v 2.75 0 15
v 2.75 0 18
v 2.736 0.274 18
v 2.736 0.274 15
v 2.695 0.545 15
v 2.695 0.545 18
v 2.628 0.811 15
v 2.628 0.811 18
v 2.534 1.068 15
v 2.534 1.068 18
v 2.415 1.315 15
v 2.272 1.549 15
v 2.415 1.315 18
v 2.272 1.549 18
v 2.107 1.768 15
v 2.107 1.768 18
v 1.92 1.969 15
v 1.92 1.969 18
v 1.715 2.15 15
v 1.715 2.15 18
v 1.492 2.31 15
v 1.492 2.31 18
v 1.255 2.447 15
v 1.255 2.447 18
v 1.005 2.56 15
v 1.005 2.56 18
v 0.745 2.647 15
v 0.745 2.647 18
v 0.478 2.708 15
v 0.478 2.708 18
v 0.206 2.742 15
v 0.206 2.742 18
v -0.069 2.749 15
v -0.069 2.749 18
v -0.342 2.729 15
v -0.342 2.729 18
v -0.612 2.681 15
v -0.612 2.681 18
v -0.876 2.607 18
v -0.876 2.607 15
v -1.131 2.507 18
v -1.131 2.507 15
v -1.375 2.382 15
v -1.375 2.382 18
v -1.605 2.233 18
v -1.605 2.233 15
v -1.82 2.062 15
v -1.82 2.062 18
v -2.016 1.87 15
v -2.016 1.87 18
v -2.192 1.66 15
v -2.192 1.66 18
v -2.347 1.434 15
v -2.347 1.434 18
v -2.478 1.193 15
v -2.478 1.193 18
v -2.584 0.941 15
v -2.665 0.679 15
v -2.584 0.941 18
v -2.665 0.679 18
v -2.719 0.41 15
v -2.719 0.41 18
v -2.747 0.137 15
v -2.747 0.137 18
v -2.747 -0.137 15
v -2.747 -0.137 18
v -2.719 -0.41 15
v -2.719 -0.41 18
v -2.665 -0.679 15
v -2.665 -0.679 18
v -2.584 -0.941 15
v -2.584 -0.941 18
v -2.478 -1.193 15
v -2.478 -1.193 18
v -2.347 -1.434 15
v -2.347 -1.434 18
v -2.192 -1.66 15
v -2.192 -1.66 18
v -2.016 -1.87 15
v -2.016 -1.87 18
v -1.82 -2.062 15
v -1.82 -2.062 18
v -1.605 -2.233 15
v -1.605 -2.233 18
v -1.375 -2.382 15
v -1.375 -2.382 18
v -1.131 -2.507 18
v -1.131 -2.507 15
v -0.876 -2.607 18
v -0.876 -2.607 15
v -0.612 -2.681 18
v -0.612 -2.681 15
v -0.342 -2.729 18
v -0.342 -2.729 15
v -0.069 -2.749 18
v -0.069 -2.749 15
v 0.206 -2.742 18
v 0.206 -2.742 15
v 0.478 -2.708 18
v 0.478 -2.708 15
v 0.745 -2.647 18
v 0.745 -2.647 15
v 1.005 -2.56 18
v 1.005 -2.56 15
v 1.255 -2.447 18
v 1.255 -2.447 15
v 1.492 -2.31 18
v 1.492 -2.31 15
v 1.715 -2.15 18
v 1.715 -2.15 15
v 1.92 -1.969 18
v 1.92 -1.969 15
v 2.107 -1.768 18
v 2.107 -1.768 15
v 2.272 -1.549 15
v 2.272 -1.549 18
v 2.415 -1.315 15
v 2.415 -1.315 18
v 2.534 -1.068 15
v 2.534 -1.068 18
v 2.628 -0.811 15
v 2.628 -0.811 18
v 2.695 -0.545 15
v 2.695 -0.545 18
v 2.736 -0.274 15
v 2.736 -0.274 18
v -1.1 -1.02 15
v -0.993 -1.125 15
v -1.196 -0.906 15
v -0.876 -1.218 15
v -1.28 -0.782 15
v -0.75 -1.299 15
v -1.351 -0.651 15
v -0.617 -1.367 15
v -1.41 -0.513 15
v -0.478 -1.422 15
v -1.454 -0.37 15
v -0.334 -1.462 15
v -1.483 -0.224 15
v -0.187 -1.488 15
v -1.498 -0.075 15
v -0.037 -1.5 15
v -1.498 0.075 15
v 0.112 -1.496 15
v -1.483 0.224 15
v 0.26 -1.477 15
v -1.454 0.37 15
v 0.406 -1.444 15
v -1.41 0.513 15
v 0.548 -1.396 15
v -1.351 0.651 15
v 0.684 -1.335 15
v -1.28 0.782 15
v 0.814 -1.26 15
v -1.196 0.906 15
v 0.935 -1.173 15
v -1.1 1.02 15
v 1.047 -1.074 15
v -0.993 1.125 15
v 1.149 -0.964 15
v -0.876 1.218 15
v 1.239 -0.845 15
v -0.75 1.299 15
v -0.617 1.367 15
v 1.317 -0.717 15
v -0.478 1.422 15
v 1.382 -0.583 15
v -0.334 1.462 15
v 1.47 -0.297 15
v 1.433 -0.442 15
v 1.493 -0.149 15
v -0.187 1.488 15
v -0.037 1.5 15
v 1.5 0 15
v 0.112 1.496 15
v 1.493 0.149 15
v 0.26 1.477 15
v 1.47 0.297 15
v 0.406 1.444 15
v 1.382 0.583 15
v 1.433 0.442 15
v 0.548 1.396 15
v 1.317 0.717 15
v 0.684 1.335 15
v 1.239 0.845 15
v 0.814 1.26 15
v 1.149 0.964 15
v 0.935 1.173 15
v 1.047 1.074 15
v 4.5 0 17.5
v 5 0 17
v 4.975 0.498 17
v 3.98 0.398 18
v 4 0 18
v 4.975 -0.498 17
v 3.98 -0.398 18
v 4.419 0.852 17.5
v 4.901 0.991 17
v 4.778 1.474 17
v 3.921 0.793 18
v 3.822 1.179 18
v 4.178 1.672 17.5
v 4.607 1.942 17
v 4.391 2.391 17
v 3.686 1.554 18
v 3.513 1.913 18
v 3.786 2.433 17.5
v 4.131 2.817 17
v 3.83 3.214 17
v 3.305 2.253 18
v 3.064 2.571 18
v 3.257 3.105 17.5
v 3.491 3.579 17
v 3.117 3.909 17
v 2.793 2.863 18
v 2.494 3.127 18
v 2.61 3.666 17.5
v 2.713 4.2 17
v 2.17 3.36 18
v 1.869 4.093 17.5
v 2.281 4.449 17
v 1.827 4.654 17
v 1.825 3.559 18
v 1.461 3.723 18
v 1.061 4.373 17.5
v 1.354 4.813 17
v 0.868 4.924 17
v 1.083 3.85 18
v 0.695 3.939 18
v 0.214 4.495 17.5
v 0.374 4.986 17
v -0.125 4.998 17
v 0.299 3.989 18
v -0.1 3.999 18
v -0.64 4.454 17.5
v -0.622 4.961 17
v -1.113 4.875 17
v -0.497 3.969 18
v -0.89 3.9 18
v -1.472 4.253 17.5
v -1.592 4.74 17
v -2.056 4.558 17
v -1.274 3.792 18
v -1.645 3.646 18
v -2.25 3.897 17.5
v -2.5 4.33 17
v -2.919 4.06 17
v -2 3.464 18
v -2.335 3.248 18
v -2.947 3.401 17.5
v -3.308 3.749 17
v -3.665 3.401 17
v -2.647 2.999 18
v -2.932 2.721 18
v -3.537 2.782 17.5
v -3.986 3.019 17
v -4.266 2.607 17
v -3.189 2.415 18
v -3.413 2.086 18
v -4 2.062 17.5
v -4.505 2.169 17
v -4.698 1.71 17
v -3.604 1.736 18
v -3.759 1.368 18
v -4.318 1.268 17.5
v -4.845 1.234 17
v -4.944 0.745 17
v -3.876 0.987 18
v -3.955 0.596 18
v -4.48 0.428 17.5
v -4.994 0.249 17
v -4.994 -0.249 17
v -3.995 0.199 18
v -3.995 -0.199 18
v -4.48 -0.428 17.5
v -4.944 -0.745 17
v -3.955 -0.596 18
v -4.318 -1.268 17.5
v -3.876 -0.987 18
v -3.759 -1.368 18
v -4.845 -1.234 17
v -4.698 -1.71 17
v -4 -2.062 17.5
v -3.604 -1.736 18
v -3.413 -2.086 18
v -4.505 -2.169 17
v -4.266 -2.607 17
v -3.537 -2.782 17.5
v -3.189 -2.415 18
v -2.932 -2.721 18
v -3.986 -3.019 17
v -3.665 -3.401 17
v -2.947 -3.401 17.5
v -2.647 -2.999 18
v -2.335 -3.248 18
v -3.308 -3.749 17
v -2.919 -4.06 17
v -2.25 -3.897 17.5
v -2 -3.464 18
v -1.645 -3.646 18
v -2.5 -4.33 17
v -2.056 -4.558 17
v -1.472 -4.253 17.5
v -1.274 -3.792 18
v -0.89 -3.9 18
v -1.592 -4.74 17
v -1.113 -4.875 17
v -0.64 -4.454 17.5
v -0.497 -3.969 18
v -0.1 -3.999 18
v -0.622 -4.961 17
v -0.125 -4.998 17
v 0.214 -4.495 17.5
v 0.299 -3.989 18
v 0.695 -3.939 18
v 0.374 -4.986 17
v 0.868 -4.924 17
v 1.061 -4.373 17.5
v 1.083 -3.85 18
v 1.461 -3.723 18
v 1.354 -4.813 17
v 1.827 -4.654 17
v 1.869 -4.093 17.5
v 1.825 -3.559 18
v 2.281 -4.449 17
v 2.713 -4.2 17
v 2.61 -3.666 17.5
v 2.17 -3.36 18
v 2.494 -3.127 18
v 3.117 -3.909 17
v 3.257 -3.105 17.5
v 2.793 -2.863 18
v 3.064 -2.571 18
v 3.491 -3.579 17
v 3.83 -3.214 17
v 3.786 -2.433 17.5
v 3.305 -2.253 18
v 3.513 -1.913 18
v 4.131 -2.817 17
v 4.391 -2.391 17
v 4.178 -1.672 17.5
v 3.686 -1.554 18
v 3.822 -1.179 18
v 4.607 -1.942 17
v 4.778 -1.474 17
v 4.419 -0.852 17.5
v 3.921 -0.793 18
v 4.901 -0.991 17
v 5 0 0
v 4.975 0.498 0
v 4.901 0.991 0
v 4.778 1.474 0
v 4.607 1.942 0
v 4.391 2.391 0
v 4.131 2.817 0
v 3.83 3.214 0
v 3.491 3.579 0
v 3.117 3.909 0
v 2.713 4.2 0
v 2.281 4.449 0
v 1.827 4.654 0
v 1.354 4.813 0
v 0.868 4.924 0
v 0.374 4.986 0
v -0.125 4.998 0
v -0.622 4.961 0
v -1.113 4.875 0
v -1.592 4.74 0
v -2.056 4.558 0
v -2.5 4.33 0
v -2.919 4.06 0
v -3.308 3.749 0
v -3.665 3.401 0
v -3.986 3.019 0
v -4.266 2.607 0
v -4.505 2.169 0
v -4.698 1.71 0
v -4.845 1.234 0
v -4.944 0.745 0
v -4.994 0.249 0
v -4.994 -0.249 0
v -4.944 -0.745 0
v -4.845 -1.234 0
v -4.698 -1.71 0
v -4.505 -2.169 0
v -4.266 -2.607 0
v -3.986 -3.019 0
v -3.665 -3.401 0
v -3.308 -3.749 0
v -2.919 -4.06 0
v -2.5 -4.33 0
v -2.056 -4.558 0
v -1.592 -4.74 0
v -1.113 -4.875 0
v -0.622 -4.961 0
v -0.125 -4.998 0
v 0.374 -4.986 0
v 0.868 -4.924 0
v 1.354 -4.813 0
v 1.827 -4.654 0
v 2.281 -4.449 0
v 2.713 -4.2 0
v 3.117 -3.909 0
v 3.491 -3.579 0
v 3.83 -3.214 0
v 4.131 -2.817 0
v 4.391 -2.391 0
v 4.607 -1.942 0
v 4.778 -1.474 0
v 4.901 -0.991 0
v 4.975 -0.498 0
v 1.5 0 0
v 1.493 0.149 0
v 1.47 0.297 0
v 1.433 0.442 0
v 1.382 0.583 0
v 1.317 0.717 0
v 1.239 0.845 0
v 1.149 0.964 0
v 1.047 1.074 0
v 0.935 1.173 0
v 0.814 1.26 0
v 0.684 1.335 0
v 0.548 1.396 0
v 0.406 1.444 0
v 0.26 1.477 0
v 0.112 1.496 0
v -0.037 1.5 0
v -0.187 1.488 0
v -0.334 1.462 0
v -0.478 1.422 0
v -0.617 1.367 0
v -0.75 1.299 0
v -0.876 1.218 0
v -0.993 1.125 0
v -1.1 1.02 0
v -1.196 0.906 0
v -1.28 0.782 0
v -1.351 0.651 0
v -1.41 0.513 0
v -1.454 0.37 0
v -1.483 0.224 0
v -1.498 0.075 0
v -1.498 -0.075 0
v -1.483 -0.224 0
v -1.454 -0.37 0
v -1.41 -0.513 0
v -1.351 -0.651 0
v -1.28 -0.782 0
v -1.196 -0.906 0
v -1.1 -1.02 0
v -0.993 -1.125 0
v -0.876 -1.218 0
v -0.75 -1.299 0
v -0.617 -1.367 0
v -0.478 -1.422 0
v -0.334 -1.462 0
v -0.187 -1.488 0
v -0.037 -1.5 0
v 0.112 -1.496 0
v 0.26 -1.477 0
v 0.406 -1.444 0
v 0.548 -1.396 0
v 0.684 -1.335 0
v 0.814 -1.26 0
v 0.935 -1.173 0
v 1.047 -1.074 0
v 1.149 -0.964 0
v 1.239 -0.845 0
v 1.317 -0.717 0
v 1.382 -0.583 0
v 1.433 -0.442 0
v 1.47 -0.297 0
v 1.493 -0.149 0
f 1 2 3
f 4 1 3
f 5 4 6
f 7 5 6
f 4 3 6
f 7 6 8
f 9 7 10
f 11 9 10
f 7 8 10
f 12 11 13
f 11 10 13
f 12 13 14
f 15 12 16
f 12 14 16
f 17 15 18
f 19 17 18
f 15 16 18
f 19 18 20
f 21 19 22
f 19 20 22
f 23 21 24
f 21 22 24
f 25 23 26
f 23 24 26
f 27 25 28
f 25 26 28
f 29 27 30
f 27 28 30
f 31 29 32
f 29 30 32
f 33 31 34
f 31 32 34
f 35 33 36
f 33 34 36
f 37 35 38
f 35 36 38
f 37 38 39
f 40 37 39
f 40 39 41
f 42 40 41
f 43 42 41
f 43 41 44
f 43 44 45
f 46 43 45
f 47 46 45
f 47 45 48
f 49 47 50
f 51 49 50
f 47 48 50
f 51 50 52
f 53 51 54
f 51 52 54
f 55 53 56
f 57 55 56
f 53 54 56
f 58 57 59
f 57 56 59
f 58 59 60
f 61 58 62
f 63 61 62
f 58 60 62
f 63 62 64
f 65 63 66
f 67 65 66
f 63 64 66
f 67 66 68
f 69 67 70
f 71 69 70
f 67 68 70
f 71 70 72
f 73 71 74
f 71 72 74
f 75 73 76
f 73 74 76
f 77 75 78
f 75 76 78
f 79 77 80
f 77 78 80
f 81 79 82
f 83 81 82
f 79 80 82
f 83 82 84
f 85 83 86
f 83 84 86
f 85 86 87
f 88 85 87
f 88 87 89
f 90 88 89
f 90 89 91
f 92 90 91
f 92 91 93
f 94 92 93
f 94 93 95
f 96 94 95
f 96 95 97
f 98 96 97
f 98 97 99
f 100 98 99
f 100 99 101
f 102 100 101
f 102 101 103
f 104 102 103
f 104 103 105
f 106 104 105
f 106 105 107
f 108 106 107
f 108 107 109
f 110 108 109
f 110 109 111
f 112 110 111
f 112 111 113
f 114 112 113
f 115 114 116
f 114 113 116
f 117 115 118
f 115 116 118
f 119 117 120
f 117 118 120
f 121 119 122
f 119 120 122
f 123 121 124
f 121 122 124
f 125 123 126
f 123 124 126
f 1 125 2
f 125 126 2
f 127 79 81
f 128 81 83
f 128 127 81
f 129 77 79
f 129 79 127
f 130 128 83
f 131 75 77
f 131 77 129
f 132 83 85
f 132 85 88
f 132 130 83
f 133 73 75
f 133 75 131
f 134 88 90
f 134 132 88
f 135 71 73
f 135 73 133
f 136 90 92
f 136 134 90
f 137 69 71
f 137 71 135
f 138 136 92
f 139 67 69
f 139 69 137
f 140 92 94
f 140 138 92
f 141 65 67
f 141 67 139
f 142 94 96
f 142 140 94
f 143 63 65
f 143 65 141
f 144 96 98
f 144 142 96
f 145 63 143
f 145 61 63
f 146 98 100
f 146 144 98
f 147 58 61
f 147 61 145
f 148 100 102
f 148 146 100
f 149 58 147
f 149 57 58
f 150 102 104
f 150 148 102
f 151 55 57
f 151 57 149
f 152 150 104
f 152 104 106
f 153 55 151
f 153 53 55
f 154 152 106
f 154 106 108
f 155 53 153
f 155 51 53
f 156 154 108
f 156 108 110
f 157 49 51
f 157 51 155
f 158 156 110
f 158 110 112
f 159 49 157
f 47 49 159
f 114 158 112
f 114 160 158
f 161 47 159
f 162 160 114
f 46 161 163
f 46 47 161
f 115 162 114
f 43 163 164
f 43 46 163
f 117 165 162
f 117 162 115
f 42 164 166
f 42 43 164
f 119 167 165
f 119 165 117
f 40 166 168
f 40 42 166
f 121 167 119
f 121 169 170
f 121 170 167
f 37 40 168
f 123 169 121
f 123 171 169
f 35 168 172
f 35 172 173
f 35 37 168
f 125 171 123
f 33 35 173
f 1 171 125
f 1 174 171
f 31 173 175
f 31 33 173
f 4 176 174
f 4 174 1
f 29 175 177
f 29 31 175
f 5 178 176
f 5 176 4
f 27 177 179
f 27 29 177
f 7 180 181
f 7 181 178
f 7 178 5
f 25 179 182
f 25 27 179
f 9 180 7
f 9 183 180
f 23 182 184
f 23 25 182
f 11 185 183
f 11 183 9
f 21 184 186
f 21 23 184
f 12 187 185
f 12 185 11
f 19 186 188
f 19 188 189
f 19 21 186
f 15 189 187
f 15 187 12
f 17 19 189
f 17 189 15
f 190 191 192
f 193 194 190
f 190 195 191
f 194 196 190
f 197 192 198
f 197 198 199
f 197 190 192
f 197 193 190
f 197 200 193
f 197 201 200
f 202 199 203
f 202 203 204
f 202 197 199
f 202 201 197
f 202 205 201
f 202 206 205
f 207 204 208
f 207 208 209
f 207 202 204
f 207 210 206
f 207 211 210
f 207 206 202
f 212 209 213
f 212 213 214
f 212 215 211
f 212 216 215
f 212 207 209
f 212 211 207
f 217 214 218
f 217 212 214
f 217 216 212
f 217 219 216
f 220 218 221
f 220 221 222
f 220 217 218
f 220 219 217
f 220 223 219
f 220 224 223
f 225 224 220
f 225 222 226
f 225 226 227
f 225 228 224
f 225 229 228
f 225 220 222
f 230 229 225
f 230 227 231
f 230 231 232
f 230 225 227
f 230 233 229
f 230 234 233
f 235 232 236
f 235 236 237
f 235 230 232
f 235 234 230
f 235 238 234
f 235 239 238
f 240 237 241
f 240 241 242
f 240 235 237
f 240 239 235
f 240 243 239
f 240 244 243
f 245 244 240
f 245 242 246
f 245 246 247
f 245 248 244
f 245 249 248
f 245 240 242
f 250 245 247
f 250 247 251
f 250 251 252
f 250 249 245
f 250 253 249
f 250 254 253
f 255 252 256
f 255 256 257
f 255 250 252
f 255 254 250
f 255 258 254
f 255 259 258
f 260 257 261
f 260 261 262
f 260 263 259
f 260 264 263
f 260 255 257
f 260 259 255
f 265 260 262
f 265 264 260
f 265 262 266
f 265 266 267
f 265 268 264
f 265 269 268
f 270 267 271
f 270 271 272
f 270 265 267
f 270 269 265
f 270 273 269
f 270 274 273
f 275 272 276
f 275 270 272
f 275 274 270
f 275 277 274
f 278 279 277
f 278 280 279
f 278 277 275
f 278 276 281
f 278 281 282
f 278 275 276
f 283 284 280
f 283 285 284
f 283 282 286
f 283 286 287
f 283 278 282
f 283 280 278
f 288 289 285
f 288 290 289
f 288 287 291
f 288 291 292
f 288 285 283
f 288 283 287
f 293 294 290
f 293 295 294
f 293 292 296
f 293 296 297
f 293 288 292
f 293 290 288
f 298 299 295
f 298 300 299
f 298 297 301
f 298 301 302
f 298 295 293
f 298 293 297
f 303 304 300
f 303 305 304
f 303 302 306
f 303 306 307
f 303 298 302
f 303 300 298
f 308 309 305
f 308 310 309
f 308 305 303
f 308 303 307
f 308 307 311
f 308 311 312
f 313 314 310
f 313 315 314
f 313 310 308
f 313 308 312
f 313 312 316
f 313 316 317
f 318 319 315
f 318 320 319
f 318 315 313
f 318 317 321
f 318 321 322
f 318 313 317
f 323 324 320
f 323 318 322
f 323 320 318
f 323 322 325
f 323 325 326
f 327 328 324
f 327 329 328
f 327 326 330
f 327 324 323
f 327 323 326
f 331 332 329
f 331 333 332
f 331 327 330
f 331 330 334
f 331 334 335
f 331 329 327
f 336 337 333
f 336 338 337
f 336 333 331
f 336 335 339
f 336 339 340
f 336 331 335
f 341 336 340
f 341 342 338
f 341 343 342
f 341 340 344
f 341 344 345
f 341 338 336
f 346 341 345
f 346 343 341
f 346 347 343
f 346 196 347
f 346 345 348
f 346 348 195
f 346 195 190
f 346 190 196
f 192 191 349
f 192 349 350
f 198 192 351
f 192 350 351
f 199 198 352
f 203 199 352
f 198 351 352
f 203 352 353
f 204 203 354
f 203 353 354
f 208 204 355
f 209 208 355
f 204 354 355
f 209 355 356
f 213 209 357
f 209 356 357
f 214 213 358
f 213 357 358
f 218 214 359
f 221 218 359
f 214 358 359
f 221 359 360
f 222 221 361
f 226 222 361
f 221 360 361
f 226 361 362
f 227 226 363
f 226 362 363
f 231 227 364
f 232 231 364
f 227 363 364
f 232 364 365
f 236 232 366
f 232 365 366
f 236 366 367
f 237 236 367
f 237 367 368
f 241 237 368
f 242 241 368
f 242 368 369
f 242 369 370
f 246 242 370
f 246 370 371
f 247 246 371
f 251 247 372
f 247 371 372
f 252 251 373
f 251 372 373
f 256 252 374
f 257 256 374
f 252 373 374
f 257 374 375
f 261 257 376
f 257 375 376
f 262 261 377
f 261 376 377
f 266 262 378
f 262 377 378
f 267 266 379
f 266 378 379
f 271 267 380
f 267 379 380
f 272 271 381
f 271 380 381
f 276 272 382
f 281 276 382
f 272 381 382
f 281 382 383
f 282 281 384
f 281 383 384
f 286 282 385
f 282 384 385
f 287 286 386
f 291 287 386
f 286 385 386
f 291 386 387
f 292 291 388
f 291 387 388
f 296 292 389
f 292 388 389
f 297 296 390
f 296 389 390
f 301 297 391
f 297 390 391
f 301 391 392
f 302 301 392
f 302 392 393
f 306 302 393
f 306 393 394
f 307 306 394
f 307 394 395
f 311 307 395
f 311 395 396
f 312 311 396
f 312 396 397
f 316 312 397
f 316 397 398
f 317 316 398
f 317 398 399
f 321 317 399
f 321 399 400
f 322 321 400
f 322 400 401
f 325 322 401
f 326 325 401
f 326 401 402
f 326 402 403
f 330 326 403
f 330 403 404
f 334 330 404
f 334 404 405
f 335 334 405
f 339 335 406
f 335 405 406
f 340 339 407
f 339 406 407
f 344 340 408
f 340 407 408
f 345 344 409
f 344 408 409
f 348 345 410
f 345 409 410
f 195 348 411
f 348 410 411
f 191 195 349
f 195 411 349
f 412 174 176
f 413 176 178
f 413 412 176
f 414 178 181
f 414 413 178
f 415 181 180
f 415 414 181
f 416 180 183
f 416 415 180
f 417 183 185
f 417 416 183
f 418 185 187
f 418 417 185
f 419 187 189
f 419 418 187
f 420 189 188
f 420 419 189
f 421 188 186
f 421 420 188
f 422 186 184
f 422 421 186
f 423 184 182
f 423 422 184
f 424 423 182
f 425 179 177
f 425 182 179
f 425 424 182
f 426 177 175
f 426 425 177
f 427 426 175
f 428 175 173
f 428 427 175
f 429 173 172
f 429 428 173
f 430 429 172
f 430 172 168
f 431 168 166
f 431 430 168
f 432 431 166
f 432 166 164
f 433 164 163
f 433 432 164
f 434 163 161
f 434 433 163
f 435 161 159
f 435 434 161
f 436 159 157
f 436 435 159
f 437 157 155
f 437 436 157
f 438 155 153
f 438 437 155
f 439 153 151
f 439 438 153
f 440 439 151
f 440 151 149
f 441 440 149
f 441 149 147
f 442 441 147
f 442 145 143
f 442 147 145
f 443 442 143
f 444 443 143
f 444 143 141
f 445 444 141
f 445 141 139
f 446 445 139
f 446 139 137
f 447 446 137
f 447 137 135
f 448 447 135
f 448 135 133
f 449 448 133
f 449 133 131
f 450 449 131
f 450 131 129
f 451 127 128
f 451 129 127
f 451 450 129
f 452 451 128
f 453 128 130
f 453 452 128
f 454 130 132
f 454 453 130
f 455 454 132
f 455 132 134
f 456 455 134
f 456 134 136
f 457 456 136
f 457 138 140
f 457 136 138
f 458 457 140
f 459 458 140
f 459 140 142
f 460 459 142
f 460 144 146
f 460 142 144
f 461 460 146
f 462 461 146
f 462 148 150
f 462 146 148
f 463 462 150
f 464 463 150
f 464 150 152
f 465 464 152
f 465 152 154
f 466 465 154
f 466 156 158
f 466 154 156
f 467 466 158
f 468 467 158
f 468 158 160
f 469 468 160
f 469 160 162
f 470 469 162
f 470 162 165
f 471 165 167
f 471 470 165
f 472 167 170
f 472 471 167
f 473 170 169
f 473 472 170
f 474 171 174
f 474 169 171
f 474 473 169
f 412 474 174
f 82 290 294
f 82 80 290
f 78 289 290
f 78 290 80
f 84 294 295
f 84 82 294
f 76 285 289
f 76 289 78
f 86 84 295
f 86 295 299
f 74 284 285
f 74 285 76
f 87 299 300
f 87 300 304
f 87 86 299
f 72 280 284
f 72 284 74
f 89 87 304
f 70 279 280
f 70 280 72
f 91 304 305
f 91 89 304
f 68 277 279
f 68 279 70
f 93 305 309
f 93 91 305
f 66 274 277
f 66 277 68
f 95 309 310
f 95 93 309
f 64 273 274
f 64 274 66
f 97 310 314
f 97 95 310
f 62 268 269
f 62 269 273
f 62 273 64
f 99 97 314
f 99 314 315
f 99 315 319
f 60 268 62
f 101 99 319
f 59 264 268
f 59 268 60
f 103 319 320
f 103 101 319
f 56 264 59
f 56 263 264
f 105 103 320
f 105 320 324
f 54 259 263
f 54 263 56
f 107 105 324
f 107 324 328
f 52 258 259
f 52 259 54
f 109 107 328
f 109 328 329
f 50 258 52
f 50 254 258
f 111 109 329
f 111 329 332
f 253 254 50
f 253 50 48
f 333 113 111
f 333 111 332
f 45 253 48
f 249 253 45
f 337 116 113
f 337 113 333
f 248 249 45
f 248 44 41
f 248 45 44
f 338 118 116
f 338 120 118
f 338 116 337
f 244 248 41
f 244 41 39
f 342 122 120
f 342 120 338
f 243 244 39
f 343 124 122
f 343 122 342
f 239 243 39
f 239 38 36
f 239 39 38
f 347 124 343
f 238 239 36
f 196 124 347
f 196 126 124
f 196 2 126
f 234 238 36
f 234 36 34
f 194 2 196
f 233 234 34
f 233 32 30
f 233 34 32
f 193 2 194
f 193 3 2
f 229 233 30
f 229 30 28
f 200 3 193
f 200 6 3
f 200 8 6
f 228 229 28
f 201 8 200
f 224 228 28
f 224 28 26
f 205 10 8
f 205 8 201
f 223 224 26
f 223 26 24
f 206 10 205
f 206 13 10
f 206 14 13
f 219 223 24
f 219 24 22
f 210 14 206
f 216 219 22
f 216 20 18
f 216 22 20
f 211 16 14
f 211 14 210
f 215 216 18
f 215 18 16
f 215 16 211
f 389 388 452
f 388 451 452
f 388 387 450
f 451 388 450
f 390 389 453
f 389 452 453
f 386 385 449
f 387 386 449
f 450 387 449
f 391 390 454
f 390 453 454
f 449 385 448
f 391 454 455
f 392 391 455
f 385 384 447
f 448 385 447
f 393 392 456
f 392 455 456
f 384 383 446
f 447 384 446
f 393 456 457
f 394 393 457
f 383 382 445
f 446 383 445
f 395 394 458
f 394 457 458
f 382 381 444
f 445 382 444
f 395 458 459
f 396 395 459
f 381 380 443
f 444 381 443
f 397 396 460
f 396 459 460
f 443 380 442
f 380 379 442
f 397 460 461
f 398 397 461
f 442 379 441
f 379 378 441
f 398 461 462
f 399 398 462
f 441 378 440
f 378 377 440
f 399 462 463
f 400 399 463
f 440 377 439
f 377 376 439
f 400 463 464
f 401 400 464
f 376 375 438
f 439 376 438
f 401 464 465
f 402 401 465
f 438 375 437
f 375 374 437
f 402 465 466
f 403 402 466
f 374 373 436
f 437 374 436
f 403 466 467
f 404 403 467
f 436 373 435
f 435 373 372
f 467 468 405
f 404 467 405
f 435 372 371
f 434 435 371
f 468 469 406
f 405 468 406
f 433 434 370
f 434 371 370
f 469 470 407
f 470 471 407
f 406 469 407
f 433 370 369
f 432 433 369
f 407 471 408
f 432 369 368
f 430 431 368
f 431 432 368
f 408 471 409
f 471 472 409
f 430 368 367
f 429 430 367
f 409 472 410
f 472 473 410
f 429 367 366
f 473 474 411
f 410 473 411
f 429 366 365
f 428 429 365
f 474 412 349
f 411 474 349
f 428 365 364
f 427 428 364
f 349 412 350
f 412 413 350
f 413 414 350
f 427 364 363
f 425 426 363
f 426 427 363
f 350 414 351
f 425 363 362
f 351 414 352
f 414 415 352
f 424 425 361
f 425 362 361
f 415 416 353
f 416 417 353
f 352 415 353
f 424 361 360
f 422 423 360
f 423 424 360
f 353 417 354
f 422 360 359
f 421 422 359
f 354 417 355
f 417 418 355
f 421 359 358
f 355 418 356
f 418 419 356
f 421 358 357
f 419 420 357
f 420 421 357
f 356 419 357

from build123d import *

# Parameters (mm, degrees)
SKETCH_R     = 5
SKETCH_R_2   = 1.5
PAD_DEPTH    = 18
SKETCH001_R  = 2.75
POCKET_DEPTH = 3
CHAMFER_SIZE = 1


with BuildPart() as part:
    # Sketch → Pad (new body)
    with BuildSketch(Plane.XY):
        Circle(SKETCH_R)
        Circle(SKETCH_R_2, mode=Mode.SUBTRACT)
    extrude(amount=PAD_DEPTH)

    # Sketch001 (on Face4 of Pad) → Pocket (cut)
    with BuildSketch(Plane.XY.offset(18)):
        Circle(SKETCH001_R)
    extrude(amount=-POCKET_DEPTH, mode=Mode.SUBTRACT)

    # Chamfer
    chamfer_edges = [part.edges().sort_by_distance(p)[0] for p in [
        (-5, 0, 18),
    ]]
    chamfer(chamfer_edges, length=CHAMFER_SIZE)


solid = part.part
